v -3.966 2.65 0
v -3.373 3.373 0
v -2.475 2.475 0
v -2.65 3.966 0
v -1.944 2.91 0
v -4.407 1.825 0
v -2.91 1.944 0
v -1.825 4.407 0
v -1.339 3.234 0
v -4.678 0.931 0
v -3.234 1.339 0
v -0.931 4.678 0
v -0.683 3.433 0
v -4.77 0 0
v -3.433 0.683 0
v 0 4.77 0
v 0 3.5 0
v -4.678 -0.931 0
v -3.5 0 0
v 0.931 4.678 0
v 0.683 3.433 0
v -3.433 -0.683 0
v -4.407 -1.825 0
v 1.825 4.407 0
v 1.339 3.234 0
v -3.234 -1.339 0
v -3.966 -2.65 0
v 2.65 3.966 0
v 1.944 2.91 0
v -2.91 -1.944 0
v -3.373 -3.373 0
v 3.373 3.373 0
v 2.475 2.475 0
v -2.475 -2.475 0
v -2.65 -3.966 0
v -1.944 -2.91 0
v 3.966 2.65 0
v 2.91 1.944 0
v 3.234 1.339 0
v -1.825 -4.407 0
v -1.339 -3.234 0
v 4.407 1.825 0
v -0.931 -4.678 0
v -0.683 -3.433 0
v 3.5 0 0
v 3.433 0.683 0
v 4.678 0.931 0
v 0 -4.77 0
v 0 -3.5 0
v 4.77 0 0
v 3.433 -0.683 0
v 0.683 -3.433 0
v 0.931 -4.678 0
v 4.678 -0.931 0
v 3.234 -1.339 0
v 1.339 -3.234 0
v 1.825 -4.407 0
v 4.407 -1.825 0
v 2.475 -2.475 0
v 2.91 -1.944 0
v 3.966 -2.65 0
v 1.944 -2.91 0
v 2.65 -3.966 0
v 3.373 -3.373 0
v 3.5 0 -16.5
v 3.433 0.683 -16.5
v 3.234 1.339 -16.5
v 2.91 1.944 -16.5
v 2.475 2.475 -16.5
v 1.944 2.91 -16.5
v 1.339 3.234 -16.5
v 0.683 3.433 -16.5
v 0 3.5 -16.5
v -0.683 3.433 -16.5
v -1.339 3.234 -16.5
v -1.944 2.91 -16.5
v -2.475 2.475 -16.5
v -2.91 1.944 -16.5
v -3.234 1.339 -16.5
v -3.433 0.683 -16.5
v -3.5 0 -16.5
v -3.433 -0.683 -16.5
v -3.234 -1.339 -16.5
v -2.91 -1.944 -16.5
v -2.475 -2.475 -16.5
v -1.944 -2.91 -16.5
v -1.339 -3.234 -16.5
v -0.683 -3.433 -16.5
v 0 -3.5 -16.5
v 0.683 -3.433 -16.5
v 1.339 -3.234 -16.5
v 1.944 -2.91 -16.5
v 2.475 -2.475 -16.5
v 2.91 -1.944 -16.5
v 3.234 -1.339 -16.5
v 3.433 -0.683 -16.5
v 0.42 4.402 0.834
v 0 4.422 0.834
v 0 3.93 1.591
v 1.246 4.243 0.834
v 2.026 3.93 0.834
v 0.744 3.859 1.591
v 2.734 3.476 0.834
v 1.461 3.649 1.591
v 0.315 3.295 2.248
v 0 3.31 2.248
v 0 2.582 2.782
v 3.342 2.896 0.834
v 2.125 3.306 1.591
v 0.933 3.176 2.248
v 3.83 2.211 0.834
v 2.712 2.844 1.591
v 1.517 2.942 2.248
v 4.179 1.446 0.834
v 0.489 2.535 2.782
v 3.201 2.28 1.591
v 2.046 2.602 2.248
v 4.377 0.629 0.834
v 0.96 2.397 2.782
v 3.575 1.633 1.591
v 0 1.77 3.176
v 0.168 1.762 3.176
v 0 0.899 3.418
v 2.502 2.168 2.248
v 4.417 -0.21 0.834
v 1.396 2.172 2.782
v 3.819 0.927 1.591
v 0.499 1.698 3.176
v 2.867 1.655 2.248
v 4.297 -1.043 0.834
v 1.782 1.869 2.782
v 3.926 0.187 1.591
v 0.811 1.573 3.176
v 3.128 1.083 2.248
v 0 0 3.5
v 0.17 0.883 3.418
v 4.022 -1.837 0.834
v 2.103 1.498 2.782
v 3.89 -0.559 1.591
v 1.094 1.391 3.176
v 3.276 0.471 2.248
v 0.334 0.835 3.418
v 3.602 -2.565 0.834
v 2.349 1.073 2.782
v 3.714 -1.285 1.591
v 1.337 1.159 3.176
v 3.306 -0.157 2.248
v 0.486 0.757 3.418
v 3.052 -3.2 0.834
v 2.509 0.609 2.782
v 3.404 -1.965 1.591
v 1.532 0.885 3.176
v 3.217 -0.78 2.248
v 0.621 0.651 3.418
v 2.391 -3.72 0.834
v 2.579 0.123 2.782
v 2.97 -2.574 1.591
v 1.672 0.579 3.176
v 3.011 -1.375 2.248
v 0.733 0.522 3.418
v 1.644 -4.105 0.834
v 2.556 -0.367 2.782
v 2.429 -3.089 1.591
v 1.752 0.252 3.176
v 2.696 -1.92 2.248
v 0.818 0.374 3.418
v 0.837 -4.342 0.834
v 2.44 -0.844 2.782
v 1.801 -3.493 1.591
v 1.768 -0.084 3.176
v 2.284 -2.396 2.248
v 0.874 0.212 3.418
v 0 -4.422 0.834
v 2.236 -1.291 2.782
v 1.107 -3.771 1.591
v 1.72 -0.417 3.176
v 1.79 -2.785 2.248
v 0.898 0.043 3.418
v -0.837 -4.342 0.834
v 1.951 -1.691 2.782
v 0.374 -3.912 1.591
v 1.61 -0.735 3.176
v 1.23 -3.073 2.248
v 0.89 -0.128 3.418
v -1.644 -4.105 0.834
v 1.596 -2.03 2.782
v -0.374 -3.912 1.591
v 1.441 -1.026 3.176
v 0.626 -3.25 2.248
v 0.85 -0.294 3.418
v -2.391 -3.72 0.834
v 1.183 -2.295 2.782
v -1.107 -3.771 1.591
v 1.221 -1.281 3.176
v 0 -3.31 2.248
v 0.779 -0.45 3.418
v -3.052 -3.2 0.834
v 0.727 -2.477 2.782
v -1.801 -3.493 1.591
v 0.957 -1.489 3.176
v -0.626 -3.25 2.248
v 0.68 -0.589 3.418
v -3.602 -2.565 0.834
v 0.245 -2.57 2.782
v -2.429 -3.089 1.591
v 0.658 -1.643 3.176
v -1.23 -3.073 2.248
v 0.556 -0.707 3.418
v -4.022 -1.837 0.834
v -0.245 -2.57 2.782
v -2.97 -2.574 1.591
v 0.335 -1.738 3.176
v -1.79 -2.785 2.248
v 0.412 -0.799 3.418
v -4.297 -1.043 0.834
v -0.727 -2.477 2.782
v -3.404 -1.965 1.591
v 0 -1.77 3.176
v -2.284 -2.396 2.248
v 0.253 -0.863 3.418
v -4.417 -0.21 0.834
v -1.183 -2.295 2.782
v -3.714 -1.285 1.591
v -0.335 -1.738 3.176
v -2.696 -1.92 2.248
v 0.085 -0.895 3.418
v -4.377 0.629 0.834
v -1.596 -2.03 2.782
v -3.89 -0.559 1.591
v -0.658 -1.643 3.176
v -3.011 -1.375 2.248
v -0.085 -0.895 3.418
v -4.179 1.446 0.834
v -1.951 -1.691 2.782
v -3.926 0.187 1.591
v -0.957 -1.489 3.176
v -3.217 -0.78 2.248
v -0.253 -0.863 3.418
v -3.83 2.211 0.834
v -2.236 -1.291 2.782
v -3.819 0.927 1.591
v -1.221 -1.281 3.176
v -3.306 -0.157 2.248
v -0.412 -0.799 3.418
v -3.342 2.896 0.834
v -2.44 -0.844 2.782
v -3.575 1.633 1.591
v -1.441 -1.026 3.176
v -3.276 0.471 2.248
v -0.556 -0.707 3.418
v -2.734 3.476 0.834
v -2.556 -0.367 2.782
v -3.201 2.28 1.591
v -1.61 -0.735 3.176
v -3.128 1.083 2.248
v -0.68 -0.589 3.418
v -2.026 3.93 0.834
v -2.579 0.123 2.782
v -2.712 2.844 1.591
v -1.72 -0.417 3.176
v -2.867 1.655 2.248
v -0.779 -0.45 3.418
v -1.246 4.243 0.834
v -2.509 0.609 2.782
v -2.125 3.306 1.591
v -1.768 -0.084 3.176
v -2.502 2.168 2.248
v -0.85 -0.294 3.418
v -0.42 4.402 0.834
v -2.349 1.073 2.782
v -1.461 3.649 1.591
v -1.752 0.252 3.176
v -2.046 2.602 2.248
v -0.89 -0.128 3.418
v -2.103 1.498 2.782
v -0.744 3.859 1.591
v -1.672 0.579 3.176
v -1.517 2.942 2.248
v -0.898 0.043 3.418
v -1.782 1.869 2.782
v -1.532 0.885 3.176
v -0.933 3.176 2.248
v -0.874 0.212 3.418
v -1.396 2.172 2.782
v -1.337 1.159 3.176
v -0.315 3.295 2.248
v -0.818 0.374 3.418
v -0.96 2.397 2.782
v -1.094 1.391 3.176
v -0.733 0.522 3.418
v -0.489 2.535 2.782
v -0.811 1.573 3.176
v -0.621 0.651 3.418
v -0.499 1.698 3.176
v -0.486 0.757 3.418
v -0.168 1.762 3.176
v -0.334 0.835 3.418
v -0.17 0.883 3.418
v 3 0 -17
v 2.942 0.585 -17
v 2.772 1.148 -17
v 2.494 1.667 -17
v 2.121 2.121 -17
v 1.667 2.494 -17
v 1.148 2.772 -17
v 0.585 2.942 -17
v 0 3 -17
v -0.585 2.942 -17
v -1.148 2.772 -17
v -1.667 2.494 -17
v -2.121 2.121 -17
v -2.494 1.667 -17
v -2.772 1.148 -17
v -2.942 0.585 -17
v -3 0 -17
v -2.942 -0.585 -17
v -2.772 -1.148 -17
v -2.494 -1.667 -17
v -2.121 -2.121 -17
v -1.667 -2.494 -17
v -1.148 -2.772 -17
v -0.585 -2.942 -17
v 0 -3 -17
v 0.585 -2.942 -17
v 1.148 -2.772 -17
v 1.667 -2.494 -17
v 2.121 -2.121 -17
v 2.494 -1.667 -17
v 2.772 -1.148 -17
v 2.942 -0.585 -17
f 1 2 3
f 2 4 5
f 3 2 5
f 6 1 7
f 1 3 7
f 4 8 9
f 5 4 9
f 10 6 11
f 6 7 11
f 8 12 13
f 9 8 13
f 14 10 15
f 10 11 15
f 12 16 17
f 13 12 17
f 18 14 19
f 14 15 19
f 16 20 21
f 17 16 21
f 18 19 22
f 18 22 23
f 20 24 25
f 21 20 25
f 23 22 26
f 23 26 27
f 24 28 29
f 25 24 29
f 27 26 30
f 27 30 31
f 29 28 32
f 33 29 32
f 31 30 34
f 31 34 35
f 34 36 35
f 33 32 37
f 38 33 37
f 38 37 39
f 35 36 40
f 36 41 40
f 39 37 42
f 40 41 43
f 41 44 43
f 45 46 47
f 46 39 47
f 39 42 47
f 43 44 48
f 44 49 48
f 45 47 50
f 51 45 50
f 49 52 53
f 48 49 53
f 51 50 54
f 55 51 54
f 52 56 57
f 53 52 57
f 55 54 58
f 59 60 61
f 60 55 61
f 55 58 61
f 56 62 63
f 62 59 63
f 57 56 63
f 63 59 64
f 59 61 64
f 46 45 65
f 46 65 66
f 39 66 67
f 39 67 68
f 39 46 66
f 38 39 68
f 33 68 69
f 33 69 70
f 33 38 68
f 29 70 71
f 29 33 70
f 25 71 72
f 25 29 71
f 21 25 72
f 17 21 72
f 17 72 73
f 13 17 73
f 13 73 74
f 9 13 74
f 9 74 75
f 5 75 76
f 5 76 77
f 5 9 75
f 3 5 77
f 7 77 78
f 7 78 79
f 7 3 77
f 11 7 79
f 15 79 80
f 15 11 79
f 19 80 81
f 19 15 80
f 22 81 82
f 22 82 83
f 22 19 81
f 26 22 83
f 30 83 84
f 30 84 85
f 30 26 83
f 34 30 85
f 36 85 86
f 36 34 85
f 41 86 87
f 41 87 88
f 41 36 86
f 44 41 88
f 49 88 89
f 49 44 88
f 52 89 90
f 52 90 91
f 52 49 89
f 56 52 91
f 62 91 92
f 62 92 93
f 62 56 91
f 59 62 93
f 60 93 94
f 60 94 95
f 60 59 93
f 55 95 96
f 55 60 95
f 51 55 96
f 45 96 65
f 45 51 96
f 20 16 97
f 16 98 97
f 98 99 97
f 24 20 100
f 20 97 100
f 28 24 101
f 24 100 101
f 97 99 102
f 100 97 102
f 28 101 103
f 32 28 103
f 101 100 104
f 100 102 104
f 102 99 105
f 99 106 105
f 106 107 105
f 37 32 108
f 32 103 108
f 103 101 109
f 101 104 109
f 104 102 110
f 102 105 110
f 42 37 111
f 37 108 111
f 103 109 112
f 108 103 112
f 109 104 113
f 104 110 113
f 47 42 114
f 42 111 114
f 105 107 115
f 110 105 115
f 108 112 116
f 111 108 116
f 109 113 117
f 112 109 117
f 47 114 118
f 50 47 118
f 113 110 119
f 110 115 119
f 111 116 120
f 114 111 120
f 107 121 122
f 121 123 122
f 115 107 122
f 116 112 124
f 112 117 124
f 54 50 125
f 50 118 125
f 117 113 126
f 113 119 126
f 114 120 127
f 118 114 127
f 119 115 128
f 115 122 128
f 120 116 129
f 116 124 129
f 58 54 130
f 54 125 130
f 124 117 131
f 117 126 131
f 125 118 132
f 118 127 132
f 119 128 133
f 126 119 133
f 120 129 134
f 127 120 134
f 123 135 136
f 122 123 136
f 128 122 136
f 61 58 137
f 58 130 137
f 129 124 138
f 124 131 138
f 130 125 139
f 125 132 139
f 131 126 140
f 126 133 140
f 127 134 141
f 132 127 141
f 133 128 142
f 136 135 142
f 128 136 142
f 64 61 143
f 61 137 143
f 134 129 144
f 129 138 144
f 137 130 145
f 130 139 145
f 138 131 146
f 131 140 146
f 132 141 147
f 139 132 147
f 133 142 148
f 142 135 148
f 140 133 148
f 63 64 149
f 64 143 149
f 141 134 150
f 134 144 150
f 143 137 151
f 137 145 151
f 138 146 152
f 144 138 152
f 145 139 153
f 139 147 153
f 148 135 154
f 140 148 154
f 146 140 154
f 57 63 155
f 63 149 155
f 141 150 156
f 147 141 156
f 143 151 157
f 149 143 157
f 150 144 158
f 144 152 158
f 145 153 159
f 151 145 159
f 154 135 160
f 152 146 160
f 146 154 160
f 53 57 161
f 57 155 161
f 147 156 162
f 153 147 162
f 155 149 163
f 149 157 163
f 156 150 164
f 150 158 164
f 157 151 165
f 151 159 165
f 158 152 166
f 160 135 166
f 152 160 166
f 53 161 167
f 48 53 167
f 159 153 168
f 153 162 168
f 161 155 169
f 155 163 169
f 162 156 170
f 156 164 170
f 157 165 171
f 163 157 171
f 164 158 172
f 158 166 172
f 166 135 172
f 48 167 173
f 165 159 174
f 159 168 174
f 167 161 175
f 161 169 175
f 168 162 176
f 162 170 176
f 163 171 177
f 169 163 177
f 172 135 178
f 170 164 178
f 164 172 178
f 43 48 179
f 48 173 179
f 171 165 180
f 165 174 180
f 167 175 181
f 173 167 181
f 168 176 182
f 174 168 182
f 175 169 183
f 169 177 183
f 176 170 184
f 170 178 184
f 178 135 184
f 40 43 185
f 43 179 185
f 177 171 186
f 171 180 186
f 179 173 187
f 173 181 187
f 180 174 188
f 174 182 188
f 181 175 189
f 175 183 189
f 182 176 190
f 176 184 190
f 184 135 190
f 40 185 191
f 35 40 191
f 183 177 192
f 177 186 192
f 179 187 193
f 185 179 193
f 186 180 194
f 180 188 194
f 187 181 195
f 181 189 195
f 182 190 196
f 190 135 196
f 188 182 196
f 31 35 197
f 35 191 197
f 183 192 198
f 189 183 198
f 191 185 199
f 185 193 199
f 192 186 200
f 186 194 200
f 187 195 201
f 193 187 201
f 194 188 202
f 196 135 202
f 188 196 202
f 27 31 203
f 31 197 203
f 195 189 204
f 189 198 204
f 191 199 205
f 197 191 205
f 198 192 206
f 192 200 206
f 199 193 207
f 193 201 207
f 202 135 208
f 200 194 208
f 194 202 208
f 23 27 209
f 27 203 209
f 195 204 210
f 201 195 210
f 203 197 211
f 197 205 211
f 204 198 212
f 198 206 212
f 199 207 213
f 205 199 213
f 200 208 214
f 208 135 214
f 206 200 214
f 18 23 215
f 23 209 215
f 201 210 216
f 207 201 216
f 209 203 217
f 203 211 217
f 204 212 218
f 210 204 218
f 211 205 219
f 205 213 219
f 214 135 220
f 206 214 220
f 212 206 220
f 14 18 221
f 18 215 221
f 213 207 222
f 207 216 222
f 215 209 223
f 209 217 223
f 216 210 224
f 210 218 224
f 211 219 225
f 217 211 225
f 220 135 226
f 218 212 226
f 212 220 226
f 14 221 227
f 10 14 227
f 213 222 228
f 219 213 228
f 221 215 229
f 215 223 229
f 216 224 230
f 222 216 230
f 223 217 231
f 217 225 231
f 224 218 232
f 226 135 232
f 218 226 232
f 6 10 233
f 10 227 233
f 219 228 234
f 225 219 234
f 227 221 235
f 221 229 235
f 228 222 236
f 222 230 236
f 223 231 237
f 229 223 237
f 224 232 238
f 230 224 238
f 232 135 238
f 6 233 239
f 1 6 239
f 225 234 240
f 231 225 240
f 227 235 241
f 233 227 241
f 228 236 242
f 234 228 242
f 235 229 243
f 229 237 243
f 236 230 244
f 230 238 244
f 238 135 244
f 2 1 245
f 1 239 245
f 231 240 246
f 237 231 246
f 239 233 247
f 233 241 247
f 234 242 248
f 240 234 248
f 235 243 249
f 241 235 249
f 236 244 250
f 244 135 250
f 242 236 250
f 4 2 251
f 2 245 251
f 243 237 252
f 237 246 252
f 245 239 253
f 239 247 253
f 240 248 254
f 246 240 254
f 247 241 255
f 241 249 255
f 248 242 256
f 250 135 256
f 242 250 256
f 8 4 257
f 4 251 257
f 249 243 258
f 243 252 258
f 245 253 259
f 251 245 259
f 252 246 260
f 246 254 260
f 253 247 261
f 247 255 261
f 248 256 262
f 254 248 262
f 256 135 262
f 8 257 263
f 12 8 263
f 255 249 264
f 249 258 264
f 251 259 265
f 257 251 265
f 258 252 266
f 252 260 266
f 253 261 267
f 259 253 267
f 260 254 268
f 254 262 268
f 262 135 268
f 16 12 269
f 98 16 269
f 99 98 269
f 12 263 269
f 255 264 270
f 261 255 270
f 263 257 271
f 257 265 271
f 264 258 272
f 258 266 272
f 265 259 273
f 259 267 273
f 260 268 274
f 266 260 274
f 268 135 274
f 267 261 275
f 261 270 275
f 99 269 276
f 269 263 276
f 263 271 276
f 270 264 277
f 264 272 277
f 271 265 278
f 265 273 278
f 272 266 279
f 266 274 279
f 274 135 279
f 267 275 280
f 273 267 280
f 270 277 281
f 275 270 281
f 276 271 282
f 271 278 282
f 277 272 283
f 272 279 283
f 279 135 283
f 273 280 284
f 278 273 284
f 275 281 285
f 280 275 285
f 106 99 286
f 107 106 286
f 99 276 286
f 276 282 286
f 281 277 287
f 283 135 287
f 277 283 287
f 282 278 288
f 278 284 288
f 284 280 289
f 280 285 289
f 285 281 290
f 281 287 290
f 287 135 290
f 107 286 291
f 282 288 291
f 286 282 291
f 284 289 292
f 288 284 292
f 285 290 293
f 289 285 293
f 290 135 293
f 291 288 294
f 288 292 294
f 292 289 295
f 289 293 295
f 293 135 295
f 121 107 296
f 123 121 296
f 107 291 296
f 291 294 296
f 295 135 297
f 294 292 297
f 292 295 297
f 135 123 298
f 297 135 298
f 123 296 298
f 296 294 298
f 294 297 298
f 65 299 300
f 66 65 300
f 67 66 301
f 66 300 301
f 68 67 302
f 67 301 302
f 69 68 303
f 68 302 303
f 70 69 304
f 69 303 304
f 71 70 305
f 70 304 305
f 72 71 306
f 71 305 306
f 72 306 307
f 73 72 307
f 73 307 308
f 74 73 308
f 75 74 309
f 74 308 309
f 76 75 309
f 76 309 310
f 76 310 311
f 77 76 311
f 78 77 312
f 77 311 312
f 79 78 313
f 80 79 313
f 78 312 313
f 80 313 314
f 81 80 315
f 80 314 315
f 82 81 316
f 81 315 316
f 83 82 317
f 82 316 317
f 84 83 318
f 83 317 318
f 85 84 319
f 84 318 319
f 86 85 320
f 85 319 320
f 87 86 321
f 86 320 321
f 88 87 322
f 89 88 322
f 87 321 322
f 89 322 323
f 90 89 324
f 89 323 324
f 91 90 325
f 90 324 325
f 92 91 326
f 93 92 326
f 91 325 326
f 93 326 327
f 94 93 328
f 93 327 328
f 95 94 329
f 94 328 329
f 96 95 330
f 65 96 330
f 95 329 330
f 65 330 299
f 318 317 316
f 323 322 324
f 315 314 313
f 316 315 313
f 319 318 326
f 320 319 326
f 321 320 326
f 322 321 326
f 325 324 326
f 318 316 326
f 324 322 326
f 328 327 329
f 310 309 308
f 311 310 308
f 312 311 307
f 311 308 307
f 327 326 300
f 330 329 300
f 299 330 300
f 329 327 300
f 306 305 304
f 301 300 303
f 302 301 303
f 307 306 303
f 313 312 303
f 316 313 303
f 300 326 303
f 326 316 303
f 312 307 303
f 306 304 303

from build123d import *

# Parameters (mm, degrees)
ESQUISSE1_R          = 3.5
BASE_EXTRUSION_DEPTH = 17
CHANFREIN1_SIZE      = 0.5


with BuildPart() as part:
    # Esquisse1 → Base-Extrusion (new body)
    with BuildSketch(Plane.XY):
        Circle(ESQUISSE1_R)
    extrude(amount=-BASE_EXTRUSION_DEPTH)

    # Esquisse3 → Boss.-Révol.1 (revolve)
    with BuildSketch(Plane(origin=(0, 0, 0), x_dir=(0, 0, -1), z_dir=(1, 0, 0))):
        with BuildLine():
            Line((0, 0), (0, 4.769696007))
            ThreePointArc((0, 4.769696007), (-2.531128874, 2.958039892), (-3.5, 0))
            Line((-3.5, 0), (0, 0))
        make_face()
    revolve(axis=Axis((0, 0, 0), (0, 0, -1)))

    # Chanfrein1
    chanfrein1_edges = [part.edges().sort_by_distance(p)[0] for p in [
        (-3.5, 0, -17),
    ]]
    chamfer(chanfrein1_edges, length=CHANFREIN1_SIZE)


solid = part.part
